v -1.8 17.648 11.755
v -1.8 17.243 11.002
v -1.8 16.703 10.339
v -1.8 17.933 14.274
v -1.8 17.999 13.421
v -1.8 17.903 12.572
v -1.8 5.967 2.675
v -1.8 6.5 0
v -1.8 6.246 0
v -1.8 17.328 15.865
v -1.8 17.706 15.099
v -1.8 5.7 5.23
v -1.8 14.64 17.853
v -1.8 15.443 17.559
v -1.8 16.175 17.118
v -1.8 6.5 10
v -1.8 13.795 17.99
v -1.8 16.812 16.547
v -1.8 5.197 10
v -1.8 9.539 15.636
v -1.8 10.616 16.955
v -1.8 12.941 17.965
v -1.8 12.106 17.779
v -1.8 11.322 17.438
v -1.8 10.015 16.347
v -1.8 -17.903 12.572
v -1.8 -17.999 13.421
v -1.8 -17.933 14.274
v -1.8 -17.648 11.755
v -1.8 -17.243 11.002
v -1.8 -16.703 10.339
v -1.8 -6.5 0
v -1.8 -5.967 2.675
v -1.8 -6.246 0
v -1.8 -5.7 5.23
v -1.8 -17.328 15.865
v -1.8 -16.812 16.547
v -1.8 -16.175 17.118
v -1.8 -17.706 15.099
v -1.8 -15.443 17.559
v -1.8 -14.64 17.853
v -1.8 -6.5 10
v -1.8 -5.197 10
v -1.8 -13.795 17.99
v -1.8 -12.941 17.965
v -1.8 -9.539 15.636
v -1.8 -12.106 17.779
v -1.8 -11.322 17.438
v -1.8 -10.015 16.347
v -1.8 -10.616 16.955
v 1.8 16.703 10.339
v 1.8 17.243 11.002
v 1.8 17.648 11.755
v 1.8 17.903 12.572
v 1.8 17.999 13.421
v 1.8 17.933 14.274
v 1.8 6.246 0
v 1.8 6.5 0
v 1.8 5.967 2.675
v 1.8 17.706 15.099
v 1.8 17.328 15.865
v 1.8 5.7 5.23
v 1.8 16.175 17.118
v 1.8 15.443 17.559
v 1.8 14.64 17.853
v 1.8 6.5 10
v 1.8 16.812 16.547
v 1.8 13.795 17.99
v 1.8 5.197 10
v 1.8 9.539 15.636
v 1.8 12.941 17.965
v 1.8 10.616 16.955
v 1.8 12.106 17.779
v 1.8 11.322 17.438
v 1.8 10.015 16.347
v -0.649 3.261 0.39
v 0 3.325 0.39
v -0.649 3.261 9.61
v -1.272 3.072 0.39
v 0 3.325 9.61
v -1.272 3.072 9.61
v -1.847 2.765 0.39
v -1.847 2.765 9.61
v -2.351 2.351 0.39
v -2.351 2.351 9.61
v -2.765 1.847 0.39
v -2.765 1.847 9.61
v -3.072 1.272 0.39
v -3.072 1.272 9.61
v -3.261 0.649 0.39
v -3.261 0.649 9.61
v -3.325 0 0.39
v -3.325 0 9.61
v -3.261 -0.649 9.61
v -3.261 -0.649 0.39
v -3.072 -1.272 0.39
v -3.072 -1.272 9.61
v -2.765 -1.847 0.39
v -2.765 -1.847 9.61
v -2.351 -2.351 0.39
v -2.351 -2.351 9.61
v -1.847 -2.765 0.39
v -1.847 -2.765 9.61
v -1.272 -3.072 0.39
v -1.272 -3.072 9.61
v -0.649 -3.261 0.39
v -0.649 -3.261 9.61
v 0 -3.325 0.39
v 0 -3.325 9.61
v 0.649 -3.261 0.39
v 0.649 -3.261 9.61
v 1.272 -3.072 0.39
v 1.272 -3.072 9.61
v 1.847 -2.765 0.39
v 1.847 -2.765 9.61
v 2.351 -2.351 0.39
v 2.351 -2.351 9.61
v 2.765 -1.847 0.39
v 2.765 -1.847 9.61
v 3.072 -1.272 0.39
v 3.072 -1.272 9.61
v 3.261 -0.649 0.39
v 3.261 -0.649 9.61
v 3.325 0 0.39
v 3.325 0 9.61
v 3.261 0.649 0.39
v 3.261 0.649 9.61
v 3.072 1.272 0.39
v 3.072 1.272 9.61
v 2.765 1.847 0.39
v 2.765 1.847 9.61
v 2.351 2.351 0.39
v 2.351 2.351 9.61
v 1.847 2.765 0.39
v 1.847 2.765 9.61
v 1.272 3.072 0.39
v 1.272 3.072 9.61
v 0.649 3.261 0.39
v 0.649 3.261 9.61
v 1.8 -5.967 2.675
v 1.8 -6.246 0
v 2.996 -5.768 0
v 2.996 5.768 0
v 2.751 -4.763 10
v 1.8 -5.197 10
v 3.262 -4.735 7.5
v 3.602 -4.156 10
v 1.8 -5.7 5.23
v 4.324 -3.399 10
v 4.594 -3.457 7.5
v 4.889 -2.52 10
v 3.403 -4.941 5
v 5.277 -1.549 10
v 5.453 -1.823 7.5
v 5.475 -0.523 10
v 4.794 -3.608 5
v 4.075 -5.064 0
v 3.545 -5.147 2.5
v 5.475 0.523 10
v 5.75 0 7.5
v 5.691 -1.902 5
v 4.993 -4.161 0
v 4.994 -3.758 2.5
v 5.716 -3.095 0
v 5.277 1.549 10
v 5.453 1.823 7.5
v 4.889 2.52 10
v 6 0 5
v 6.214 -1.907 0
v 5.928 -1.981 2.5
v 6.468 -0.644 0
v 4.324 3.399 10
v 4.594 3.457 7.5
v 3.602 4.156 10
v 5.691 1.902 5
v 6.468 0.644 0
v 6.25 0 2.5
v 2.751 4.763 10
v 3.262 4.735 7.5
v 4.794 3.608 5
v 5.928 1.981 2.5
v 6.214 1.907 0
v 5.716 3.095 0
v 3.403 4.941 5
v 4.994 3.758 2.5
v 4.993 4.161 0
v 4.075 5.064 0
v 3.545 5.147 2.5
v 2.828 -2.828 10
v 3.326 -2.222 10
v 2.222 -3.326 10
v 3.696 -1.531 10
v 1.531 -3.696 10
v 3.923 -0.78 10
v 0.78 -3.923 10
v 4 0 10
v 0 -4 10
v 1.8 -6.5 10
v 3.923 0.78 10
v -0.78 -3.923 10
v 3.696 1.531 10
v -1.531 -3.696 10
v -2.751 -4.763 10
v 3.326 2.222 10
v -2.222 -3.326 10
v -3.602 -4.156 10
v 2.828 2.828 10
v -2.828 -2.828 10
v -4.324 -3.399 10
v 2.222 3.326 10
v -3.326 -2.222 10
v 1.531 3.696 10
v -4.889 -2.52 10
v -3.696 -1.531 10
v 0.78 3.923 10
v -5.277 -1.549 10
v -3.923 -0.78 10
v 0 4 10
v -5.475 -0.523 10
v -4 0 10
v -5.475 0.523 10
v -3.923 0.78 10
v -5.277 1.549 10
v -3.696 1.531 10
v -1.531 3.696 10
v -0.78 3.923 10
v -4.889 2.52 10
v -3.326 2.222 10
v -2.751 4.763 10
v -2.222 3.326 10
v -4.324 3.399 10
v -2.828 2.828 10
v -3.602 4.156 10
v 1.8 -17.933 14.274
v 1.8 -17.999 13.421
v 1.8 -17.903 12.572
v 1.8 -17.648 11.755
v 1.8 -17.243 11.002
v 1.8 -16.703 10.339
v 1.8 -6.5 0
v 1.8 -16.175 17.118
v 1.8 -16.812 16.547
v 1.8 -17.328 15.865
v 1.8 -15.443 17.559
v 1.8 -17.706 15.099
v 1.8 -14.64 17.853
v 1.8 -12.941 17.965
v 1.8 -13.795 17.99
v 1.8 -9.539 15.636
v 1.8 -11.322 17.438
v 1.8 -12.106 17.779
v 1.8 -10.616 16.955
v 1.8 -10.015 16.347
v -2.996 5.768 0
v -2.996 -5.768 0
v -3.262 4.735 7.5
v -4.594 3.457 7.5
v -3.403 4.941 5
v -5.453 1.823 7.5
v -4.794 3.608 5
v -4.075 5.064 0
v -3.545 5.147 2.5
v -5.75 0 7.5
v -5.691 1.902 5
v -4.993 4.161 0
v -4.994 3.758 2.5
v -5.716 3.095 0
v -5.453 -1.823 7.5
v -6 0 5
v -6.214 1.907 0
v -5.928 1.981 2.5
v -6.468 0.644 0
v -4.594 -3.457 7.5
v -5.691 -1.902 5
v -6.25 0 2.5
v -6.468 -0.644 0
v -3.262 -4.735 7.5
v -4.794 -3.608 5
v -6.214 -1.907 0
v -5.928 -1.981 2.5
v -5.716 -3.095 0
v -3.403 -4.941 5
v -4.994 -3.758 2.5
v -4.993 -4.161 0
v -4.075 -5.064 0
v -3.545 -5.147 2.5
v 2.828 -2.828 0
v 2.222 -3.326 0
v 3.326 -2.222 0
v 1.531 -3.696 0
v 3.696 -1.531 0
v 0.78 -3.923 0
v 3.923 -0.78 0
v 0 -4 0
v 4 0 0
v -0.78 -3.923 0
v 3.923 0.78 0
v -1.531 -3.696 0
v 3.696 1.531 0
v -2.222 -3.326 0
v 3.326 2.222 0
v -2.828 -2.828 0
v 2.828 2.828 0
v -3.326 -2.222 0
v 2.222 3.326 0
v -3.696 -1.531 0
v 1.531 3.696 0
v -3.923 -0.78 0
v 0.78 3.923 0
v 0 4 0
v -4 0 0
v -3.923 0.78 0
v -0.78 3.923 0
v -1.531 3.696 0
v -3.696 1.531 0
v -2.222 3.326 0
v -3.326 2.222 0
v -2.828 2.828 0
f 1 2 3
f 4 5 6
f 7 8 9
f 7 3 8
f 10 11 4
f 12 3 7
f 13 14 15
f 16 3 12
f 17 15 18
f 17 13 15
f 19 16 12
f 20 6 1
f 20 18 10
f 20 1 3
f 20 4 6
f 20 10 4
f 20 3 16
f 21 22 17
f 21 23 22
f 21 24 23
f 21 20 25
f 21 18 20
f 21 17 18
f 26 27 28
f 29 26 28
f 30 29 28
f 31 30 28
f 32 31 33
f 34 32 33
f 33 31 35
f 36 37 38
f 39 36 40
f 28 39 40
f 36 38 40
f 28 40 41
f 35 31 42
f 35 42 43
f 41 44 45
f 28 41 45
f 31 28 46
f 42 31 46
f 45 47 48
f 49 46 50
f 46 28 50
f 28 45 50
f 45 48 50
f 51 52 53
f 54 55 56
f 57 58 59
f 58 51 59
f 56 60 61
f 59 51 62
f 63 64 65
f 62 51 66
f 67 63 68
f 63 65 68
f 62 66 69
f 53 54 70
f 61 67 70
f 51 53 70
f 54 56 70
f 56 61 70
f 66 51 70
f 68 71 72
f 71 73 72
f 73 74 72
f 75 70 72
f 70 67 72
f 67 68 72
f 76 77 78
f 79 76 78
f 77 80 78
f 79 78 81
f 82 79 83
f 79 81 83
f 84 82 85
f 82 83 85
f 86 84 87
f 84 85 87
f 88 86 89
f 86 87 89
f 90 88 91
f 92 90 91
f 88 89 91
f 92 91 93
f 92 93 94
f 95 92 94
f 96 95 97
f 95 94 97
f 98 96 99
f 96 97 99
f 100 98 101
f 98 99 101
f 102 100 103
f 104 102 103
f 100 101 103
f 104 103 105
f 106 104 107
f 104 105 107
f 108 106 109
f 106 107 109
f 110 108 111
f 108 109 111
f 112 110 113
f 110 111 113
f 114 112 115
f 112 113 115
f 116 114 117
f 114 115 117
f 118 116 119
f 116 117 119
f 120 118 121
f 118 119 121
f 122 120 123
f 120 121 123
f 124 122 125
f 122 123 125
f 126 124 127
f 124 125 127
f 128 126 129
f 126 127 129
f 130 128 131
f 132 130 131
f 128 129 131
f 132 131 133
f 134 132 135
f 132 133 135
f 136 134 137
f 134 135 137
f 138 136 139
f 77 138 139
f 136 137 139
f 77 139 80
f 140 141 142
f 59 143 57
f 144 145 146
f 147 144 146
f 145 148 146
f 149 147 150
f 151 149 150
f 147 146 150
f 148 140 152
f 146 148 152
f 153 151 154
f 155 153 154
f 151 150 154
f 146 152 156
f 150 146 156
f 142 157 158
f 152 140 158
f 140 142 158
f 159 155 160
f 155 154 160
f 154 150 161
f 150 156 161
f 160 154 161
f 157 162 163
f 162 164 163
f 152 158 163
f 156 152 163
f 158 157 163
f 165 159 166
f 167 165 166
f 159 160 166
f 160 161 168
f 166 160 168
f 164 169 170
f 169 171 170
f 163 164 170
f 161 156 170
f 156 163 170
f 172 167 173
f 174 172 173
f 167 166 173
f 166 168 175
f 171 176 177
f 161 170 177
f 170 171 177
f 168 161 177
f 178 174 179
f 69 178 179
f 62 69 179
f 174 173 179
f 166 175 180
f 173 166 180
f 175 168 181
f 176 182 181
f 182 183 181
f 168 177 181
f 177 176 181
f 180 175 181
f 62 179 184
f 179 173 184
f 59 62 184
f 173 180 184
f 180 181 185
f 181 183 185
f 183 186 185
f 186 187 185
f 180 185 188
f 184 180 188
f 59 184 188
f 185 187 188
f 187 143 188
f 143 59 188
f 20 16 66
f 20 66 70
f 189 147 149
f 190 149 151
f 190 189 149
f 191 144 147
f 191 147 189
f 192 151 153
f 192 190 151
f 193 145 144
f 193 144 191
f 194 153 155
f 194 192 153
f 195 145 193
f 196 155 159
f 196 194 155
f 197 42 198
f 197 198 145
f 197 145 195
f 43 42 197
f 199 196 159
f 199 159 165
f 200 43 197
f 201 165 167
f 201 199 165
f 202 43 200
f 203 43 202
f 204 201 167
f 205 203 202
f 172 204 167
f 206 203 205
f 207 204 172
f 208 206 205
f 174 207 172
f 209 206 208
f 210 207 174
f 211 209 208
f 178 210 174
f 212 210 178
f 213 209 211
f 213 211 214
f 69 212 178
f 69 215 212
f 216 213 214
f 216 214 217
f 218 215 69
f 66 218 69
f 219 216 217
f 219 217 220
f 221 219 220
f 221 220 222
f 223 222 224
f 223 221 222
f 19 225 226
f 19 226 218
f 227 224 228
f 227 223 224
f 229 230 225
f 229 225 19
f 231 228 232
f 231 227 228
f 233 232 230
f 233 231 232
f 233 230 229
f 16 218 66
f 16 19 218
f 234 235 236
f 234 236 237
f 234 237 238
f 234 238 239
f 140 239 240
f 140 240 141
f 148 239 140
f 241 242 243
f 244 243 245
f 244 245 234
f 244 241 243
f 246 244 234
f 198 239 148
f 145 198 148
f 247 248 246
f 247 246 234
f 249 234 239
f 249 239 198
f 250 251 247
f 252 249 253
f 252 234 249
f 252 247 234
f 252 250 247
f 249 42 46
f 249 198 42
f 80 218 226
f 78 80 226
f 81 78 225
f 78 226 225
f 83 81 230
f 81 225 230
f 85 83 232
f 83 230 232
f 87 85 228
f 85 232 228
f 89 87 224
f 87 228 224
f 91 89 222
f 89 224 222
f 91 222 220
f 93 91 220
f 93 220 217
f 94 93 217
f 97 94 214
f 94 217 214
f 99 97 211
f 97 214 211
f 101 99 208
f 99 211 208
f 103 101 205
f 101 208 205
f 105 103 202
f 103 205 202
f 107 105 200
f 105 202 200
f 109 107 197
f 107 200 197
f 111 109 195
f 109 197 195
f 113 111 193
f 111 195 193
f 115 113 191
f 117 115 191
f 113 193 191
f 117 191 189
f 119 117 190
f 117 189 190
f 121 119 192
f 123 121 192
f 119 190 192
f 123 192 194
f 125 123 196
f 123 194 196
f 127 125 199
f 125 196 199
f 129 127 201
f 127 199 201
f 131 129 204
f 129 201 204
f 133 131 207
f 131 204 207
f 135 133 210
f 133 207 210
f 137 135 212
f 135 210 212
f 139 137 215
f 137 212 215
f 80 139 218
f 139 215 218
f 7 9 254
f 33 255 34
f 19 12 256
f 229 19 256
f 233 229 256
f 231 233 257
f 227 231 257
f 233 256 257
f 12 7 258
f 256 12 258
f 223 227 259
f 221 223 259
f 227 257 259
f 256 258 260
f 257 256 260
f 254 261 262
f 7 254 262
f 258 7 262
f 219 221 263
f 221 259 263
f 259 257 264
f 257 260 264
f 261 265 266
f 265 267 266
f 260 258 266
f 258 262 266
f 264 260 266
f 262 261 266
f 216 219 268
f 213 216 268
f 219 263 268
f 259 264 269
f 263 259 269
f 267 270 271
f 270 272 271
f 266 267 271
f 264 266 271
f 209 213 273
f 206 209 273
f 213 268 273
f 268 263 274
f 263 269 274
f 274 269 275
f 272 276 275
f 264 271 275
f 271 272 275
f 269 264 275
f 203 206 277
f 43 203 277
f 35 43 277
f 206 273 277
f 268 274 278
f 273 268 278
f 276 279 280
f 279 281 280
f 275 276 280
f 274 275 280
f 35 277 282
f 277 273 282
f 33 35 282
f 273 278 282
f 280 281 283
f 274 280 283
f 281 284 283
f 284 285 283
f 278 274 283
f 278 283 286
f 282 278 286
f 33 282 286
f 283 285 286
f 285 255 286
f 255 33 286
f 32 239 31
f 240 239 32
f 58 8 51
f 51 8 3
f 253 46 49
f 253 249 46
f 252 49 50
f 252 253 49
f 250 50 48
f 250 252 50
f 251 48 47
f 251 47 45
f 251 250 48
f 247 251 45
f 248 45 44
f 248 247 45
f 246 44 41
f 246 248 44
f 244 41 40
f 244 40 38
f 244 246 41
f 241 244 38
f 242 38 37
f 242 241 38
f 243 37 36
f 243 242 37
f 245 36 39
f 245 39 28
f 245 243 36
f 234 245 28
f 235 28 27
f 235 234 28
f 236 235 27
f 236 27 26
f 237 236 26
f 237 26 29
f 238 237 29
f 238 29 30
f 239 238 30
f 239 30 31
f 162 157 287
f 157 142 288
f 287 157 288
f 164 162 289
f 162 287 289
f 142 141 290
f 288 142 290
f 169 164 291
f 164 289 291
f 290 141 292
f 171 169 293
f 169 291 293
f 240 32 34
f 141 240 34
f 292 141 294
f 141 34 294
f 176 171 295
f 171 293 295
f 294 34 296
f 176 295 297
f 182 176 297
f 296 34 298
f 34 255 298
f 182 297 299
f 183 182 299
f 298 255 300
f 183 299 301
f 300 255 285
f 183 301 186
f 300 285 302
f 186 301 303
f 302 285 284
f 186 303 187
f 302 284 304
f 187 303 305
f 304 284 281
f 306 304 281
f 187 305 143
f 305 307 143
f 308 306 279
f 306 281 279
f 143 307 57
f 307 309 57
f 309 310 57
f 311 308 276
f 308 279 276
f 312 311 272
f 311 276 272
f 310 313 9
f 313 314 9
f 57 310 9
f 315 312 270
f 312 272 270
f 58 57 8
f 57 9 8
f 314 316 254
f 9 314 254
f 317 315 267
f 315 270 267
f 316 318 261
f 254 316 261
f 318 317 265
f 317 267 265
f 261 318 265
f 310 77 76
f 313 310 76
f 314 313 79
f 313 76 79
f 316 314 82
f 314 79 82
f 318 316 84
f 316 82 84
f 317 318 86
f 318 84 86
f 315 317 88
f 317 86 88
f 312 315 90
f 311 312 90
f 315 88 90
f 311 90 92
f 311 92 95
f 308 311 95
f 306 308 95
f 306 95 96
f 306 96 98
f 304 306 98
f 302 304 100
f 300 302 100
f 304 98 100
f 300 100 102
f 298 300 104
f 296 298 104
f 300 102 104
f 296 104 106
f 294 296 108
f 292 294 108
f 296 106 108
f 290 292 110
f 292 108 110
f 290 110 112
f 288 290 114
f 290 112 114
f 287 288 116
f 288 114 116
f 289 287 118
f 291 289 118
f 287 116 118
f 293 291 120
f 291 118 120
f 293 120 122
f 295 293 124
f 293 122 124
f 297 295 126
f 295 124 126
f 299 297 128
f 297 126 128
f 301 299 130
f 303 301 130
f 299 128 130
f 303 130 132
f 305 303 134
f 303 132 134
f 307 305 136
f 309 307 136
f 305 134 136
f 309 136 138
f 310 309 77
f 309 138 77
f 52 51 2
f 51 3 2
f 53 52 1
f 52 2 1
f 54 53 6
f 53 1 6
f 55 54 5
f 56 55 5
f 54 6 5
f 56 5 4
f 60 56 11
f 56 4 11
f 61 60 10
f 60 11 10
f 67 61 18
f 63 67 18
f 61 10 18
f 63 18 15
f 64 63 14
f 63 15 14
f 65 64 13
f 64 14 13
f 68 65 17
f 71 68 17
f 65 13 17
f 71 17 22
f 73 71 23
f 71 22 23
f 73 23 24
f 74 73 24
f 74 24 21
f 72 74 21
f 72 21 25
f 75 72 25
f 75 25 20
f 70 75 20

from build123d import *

# Parameters (mm, degrees)
PAD_DEPTH = 1.8


with BuildPart() as pad:
    # Sketch001 → Pad (new body, symmetric)
    with BuildSketch(Plane.YZ):
        with BuildLine():
            Line((4, 0), (4, 10))
            Line((4, 10), (6.5, 10))
            Line((6.5, 10), (9.53921, 15.635917))
            ThreePointArc((16.703013, 10.339192), (16.175328, 17.118372), (9.53921, 15.635917))
            Line((6.5, 0), (16.703013, 10.339192))
            Line((4, 0), (6.5, 0))
        make_face()
        with BuildLine():
            Line((-16.703013, 10.339192), (-6.5, 0))
            Line((-6.5, 0), (-4, 0))
            Line((-4, 0), (-4, 10))
            Line((-4, 10), (-6.5, 10))
            Line((-6.5, 10), (-9.53921, 15.635917))
            ThreePointArc((-9.53921, 15.635917), (-16.175328, 17.118372), (-16.703013, 10.339192))
        make_face()
    extrude(amount=PAD_DEPTH, both=True)


with BuildPart() as fl_gelmutter_din_315_m8:
    # Sketch → Revolution (revolve)
    with BuildSketch(Plane.YZ):
        Polygon((4, 0), (3.325, 0.389711), (3.325, 9.610289), (4, 10), (5.5, 10), (6.5, 0), align=None)
    revolve(axis=Axis((0, 0, 0), (0, 0, 1)))

    # Fusion: union Pad
    add(pad.part)


solid = fl_gelmutter_din_315_m8.part
